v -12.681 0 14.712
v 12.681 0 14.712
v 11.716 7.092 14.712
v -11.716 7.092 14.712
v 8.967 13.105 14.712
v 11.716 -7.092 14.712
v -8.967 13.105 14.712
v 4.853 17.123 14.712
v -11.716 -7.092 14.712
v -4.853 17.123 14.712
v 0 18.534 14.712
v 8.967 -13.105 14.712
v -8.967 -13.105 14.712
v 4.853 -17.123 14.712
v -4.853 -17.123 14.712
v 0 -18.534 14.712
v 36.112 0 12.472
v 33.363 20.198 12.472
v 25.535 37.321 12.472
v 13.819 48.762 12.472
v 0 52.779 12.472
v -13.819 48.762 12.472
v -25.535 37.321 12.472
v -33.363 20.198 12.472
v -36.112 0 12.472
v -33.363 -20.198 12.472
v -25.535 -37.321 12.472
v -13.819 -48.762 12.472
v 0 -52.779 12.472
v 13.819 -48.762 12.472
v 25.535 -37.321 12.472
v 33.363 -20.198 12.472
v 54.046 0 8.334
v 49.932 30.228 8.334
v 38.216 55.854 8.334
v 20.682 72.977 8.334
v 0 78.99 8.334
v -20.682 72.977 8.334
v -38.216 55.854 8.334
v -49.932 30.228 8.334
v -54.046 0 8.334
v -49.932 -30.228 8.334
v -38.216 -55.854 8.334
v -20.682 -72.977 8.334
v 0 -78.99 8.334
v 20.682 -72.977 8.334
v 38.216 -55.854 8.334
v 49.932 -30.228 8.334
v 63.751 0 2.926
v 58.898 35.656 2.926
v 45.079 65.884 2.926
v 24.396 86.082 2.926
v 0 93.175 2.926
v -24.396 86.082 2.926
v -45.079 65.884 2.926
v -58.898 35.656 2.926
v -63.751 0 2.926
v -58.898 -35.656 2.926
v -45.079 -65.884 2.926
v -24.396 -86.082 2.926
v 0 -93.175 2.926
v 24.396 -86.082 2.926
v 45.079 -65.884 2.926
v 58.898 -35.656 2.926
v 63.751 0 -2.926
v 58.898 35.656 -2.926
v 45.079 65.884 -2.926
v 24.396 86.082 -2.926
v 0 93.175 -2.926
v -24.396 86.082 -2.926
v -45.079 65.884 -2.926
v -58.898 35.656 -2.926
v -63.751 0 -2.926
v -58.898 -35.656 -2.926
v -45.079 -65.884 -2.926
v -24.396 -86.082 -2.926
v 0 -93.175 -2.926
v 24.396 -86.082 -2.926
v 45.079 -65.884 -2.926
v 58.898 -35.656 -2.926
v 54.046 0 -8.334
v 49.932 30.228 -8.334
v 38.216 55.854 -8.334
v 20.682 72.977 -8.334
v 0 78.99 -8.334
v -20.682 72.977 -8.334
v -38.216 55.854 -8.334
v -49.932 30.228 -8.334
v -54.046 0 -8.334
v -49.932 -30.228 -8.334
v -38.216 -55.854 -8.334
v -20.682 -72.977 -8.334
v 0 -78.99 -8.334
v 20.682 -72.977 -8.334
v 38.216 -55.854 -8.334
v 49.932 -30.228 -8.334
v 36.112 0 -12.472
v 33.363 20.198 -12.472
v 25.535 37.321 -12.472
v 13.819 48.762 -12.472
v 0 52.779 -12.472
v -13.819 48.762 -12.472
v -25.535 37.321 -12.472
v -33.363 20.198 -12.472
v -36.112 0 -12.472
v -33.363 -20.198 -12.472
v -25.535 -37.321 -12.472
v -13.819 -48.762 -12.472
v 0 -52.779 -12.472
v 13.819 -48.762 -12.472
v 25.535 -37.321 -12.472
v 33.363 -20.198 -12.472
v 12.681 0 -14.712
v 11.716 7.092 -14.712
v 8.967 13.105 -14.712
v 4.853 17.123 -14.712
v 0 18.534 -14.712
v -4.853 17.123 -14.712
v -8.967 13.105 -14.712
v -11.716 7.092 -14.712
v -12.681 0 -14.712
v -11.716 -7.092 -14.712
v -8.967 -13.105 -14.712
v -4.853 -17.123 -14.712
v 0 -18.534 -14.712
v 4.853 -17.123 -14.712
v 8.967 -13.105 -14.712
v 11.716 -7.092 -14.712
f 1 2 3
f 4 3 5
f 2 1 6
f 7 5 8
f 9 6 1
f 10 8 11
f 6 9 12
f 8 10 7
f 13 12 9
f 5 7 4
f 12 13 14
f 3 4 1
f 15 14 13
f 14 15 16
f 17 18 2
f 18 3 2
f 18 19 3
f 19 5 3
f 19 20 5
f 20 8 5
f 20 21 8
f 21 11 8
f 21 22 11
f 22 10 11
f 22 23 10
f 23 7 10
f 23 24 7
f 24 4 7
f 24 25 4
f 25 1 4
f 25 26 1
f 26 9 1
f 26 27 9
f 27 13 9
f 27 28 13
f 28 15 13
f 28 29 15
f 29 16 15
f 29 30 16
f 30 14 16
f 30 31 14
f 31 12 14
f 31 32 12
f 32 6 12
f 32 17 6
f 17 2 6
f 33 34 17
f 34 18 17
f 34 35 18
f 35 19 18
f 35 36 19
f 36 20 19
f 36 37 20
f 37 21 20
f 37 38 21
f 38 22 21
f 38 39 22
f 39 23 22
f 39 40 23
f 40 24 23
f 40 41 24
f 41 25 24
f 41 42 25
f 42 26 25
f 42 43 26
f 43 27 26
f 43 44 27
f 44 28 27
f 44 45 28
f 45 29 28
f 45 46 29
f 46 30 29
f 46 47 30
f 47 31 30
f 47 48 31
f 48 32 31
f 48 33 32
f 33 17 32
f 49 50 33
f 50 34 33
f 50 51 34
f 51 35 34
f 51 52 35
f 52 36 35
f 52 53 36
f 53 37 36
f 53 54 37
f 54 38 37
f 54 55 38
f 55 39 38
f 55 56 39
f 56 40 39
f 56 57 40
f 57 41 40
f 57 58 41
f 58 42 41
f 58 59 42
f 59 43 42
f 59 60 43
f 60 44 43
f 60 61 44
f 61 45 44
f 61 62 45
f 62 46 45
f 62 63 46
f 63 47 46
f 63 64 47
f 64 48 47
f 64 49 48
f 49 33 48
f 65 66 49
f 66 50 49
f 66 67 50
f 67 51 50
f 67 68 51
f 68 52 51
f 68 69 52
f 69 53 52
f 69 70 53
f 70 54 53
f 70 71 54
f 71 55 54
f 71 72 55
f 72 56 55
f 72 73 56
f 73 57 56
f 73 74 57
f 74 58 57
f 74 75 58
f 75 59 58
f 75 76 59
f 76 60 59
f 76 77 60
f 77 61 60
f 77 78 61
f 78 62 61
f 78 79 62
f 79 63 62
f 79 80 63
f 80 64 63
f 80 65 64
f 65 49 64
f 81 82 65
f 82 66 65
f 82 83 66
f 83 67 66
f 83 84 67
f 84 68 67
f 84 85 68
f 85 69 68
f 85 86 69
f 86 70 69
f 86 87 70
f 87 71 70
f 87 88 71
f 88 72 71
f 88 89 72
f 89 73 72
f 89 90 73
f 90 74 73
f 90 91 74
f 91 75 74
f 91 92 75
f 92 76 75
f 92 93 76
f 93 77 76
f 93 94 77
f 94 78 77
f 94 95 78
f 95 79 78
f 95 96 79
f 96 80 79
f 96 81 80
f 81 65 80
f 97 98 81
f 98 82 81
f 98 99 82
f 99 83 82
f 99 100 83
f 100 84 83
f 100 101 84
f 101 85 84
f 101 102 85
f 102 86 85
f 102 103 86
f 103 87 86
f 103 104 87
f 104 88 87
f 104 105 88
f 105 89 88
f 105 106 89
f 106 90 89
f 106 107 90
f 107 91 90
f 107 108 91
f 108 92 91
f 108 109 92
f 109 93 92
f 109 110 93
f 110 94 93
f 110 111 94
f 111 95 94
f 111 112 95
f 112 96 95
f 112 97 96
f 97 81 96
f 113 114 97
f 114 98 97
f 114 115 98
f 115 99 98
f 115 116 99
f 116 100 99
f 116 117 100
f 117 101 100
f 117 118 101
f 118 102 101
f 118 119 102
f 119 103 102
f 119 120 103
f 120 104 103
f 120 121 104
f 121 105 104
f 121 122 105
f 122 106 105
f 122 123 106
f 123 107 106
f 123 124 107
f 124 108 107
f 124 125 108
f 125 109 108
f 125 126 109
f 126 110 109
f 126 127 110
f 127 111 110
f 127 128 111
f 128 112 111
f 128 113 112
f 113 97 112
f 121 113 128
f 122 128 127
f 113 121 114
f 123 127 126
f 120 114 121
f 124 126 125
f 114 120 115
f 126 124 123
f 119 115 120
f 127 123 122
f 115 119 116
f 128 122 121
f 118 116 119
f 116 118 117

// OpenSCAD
// Generated by SolidPython 1.0.1 on 2020-07-29 00:46:51


scale(v = [13, 19, 3]) {
	sphere(r = 5);
}
/***********************************************
*********      SolidPython code:      **********
************************************************
 
# import packages: SolidPython
from solid import *
from solid.utils import *
from itertools import chain, combinations, permutations


class Resize:

    def __init__(self, scad_file):
        self.scad_file = scad_file
        #self.scad_file = import_scad(scad_file)
        # cone/cylinder param:
        self.r1 = 0
        self.r2 = 0
        self.h = 0
        # rectangular prism param:
        self.w = 0
        self.l = 0
        # ellipse param:
        self.r = 0

    # import OpenScad code (file name corresponds to shape)


    # classify shape + parameters
    def assign(self, param1, param2, param3):
        if self.scad_file == 'cone.scad':
            self.r1 = param1
            self.r2 = param2
            self.h = param3
        elif self.scad_file == 'cylinder.scad':
            self.r1 = param1
            self.r2 = param2
            self.h = param3
        elif self.scad_file == 'rectangularPrism.scad':
            self.h = param1
            self.l = param2
            self.w = param3
        else:
            self.r = param1
            self.h = param2

    # resize parameters
    def iterate(self):
        x = range(3, 20, 2)
        i = 1
        if self.scad_file == 'cone.scad':
            tempList = list(permutations(x, 2))
            for temp in tempList:
                param1 = temp[0]
                param2 = temp[1]
                filepath = 'produced_scad_files/' + 'cone' + str(param1) + '_' + str(param2) + '_' + '.scad'
                scad_render_to_file(cylinder(h=param1, r1=param2, r2=0), filepath)

        elif self.scad_file == 'cylinder.scad':
            tempList = list(permutations(x, 3))
            for temp in tempList:
                param1 = temp[0]
                param2 = temp[1]
                filepath = 'produced_scad_files/' + 'cylinder' + str(param1) + '_' + str(param2) + '_' + '.scad'
                scad_render_to_file(cylinder(h=param1, r1=param2, r2=param2), filepath)

        elif self.scad_file == 'rectangularPrism.scad':
            tempList = list(permutations(x, 3))
            for temp in tempList:
                param1 = temp[0]
                param2 = temp[1]
                param3 = temp[2]
                filepath = 'produced_scad_files/' + 'rectangularPrism' + str(param1) + '_' + str(param2) + '_' + str(
                    param3) + '.scad'
                scad_render_to_file(cube(size=(param1, param2, param3)), filepath)

        elif self.scad_file == 'ellipse.scad':
            tempList = list(permutations(x, 4))
            for temp in tempList:
                param1 = temp[0]
                param2 = temp[1]
                param3 = temp[2]
                param4 = temp[3]
                filepath = 'produced_scad_files/' + 'ellipse' + str(param1) + '_' + str(param2) + '_' + str(param3) + '_' + str(param4) + '.scad'
                scad_render_to_file(scale([param1, param2, param3])(sphere(r=param4)), filepath)

    def render_to_scadfile(self):
        scad_render_to_file(scad, 'example.scad') 
 
************************************************/
